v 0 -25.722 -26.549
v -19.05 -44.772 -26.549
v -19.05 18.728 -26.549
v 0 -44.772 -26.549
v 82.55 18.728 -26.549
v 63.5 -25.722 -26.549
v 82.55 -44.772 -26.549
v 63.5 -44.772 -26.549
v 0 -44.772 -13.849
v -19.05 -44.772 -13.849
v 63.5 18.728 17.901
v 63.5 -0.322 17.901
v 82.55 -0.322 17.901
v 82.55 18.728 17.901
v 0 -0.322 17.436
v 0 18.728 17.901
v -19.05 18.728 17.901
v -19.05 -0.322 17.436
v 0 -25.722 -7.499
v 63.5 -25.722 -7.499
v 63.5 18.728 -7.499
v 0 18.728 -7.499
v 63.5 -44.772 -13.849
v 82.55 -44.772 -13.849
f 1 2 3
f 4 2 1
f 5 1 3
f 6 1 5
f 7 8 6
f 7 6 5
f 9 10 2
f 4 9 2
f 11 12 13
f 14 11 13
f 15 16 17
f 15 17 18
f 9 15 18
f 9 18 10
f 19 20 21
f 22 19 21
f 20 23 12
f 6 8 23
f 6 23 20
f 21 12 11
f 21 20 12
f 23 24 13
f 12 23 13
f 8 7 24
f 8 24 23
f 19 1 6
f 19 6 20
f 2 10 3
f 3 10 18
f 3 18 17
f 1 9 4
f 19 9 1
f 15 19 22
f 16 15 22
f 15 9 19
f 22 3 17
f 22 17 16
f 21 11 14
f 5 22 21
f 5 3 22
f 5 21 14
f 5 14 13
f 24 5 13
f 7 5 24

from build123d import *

# Parameters (mm, degrees)
F1_DEPTH = 19.05
F2_W     = 44.45
F2_H     = 19.05
F3_DEPTH = 63.5
F5_DEPTH = 44.45
F7_DEPTH = 25.4


with BuildPart() as f1:
    # F0 (on Right) → F1 (new body)
    with BuildSketch(Plane.YZ):
        Polygon((-44.772066, -13.848902), (-44.772066, -26.548902), (18.727934, -26.548902), (18.727934, 17.901098), (-0.322066, 17.436433), align=None)
    extrude(amount=-F1_DEPTH)

    # F2 (on face) → F3 (join)
    with BuildSketch(Plane.YZ):
        with Locations((-3.497066, -17.023902)):
            Rectangle(F2_W, F2_H)
    extrude(amount=F3_DEPTH)

    # F4 (on face) → F5 (join)
    with BuildSketch(Plane(origin=(0, 0, -26.548902), x_dir=(1, 0, 0), z_dir=(0, 0, -1))):
        Polygon((63.5, 25.722066), (63.5, -18.727934), (82.55, -18.727934), (82.55, 44.772066), (63.5, 44.772066), align=None)
    extrude(amount=-F5_DEPTH)

    # F6 (on face) → F7 (cut)
    with BuildSketch(Plane.YZ.offset(82.55)):
        Polygon((-44.772066, 17.901098), (-44.772066, -13.848902), (-0.322066, 17.901098), align=None)
    extrude(amount=-F7_DEPTH, mode=Mode.SUBTRACT)


solid = f1.part
